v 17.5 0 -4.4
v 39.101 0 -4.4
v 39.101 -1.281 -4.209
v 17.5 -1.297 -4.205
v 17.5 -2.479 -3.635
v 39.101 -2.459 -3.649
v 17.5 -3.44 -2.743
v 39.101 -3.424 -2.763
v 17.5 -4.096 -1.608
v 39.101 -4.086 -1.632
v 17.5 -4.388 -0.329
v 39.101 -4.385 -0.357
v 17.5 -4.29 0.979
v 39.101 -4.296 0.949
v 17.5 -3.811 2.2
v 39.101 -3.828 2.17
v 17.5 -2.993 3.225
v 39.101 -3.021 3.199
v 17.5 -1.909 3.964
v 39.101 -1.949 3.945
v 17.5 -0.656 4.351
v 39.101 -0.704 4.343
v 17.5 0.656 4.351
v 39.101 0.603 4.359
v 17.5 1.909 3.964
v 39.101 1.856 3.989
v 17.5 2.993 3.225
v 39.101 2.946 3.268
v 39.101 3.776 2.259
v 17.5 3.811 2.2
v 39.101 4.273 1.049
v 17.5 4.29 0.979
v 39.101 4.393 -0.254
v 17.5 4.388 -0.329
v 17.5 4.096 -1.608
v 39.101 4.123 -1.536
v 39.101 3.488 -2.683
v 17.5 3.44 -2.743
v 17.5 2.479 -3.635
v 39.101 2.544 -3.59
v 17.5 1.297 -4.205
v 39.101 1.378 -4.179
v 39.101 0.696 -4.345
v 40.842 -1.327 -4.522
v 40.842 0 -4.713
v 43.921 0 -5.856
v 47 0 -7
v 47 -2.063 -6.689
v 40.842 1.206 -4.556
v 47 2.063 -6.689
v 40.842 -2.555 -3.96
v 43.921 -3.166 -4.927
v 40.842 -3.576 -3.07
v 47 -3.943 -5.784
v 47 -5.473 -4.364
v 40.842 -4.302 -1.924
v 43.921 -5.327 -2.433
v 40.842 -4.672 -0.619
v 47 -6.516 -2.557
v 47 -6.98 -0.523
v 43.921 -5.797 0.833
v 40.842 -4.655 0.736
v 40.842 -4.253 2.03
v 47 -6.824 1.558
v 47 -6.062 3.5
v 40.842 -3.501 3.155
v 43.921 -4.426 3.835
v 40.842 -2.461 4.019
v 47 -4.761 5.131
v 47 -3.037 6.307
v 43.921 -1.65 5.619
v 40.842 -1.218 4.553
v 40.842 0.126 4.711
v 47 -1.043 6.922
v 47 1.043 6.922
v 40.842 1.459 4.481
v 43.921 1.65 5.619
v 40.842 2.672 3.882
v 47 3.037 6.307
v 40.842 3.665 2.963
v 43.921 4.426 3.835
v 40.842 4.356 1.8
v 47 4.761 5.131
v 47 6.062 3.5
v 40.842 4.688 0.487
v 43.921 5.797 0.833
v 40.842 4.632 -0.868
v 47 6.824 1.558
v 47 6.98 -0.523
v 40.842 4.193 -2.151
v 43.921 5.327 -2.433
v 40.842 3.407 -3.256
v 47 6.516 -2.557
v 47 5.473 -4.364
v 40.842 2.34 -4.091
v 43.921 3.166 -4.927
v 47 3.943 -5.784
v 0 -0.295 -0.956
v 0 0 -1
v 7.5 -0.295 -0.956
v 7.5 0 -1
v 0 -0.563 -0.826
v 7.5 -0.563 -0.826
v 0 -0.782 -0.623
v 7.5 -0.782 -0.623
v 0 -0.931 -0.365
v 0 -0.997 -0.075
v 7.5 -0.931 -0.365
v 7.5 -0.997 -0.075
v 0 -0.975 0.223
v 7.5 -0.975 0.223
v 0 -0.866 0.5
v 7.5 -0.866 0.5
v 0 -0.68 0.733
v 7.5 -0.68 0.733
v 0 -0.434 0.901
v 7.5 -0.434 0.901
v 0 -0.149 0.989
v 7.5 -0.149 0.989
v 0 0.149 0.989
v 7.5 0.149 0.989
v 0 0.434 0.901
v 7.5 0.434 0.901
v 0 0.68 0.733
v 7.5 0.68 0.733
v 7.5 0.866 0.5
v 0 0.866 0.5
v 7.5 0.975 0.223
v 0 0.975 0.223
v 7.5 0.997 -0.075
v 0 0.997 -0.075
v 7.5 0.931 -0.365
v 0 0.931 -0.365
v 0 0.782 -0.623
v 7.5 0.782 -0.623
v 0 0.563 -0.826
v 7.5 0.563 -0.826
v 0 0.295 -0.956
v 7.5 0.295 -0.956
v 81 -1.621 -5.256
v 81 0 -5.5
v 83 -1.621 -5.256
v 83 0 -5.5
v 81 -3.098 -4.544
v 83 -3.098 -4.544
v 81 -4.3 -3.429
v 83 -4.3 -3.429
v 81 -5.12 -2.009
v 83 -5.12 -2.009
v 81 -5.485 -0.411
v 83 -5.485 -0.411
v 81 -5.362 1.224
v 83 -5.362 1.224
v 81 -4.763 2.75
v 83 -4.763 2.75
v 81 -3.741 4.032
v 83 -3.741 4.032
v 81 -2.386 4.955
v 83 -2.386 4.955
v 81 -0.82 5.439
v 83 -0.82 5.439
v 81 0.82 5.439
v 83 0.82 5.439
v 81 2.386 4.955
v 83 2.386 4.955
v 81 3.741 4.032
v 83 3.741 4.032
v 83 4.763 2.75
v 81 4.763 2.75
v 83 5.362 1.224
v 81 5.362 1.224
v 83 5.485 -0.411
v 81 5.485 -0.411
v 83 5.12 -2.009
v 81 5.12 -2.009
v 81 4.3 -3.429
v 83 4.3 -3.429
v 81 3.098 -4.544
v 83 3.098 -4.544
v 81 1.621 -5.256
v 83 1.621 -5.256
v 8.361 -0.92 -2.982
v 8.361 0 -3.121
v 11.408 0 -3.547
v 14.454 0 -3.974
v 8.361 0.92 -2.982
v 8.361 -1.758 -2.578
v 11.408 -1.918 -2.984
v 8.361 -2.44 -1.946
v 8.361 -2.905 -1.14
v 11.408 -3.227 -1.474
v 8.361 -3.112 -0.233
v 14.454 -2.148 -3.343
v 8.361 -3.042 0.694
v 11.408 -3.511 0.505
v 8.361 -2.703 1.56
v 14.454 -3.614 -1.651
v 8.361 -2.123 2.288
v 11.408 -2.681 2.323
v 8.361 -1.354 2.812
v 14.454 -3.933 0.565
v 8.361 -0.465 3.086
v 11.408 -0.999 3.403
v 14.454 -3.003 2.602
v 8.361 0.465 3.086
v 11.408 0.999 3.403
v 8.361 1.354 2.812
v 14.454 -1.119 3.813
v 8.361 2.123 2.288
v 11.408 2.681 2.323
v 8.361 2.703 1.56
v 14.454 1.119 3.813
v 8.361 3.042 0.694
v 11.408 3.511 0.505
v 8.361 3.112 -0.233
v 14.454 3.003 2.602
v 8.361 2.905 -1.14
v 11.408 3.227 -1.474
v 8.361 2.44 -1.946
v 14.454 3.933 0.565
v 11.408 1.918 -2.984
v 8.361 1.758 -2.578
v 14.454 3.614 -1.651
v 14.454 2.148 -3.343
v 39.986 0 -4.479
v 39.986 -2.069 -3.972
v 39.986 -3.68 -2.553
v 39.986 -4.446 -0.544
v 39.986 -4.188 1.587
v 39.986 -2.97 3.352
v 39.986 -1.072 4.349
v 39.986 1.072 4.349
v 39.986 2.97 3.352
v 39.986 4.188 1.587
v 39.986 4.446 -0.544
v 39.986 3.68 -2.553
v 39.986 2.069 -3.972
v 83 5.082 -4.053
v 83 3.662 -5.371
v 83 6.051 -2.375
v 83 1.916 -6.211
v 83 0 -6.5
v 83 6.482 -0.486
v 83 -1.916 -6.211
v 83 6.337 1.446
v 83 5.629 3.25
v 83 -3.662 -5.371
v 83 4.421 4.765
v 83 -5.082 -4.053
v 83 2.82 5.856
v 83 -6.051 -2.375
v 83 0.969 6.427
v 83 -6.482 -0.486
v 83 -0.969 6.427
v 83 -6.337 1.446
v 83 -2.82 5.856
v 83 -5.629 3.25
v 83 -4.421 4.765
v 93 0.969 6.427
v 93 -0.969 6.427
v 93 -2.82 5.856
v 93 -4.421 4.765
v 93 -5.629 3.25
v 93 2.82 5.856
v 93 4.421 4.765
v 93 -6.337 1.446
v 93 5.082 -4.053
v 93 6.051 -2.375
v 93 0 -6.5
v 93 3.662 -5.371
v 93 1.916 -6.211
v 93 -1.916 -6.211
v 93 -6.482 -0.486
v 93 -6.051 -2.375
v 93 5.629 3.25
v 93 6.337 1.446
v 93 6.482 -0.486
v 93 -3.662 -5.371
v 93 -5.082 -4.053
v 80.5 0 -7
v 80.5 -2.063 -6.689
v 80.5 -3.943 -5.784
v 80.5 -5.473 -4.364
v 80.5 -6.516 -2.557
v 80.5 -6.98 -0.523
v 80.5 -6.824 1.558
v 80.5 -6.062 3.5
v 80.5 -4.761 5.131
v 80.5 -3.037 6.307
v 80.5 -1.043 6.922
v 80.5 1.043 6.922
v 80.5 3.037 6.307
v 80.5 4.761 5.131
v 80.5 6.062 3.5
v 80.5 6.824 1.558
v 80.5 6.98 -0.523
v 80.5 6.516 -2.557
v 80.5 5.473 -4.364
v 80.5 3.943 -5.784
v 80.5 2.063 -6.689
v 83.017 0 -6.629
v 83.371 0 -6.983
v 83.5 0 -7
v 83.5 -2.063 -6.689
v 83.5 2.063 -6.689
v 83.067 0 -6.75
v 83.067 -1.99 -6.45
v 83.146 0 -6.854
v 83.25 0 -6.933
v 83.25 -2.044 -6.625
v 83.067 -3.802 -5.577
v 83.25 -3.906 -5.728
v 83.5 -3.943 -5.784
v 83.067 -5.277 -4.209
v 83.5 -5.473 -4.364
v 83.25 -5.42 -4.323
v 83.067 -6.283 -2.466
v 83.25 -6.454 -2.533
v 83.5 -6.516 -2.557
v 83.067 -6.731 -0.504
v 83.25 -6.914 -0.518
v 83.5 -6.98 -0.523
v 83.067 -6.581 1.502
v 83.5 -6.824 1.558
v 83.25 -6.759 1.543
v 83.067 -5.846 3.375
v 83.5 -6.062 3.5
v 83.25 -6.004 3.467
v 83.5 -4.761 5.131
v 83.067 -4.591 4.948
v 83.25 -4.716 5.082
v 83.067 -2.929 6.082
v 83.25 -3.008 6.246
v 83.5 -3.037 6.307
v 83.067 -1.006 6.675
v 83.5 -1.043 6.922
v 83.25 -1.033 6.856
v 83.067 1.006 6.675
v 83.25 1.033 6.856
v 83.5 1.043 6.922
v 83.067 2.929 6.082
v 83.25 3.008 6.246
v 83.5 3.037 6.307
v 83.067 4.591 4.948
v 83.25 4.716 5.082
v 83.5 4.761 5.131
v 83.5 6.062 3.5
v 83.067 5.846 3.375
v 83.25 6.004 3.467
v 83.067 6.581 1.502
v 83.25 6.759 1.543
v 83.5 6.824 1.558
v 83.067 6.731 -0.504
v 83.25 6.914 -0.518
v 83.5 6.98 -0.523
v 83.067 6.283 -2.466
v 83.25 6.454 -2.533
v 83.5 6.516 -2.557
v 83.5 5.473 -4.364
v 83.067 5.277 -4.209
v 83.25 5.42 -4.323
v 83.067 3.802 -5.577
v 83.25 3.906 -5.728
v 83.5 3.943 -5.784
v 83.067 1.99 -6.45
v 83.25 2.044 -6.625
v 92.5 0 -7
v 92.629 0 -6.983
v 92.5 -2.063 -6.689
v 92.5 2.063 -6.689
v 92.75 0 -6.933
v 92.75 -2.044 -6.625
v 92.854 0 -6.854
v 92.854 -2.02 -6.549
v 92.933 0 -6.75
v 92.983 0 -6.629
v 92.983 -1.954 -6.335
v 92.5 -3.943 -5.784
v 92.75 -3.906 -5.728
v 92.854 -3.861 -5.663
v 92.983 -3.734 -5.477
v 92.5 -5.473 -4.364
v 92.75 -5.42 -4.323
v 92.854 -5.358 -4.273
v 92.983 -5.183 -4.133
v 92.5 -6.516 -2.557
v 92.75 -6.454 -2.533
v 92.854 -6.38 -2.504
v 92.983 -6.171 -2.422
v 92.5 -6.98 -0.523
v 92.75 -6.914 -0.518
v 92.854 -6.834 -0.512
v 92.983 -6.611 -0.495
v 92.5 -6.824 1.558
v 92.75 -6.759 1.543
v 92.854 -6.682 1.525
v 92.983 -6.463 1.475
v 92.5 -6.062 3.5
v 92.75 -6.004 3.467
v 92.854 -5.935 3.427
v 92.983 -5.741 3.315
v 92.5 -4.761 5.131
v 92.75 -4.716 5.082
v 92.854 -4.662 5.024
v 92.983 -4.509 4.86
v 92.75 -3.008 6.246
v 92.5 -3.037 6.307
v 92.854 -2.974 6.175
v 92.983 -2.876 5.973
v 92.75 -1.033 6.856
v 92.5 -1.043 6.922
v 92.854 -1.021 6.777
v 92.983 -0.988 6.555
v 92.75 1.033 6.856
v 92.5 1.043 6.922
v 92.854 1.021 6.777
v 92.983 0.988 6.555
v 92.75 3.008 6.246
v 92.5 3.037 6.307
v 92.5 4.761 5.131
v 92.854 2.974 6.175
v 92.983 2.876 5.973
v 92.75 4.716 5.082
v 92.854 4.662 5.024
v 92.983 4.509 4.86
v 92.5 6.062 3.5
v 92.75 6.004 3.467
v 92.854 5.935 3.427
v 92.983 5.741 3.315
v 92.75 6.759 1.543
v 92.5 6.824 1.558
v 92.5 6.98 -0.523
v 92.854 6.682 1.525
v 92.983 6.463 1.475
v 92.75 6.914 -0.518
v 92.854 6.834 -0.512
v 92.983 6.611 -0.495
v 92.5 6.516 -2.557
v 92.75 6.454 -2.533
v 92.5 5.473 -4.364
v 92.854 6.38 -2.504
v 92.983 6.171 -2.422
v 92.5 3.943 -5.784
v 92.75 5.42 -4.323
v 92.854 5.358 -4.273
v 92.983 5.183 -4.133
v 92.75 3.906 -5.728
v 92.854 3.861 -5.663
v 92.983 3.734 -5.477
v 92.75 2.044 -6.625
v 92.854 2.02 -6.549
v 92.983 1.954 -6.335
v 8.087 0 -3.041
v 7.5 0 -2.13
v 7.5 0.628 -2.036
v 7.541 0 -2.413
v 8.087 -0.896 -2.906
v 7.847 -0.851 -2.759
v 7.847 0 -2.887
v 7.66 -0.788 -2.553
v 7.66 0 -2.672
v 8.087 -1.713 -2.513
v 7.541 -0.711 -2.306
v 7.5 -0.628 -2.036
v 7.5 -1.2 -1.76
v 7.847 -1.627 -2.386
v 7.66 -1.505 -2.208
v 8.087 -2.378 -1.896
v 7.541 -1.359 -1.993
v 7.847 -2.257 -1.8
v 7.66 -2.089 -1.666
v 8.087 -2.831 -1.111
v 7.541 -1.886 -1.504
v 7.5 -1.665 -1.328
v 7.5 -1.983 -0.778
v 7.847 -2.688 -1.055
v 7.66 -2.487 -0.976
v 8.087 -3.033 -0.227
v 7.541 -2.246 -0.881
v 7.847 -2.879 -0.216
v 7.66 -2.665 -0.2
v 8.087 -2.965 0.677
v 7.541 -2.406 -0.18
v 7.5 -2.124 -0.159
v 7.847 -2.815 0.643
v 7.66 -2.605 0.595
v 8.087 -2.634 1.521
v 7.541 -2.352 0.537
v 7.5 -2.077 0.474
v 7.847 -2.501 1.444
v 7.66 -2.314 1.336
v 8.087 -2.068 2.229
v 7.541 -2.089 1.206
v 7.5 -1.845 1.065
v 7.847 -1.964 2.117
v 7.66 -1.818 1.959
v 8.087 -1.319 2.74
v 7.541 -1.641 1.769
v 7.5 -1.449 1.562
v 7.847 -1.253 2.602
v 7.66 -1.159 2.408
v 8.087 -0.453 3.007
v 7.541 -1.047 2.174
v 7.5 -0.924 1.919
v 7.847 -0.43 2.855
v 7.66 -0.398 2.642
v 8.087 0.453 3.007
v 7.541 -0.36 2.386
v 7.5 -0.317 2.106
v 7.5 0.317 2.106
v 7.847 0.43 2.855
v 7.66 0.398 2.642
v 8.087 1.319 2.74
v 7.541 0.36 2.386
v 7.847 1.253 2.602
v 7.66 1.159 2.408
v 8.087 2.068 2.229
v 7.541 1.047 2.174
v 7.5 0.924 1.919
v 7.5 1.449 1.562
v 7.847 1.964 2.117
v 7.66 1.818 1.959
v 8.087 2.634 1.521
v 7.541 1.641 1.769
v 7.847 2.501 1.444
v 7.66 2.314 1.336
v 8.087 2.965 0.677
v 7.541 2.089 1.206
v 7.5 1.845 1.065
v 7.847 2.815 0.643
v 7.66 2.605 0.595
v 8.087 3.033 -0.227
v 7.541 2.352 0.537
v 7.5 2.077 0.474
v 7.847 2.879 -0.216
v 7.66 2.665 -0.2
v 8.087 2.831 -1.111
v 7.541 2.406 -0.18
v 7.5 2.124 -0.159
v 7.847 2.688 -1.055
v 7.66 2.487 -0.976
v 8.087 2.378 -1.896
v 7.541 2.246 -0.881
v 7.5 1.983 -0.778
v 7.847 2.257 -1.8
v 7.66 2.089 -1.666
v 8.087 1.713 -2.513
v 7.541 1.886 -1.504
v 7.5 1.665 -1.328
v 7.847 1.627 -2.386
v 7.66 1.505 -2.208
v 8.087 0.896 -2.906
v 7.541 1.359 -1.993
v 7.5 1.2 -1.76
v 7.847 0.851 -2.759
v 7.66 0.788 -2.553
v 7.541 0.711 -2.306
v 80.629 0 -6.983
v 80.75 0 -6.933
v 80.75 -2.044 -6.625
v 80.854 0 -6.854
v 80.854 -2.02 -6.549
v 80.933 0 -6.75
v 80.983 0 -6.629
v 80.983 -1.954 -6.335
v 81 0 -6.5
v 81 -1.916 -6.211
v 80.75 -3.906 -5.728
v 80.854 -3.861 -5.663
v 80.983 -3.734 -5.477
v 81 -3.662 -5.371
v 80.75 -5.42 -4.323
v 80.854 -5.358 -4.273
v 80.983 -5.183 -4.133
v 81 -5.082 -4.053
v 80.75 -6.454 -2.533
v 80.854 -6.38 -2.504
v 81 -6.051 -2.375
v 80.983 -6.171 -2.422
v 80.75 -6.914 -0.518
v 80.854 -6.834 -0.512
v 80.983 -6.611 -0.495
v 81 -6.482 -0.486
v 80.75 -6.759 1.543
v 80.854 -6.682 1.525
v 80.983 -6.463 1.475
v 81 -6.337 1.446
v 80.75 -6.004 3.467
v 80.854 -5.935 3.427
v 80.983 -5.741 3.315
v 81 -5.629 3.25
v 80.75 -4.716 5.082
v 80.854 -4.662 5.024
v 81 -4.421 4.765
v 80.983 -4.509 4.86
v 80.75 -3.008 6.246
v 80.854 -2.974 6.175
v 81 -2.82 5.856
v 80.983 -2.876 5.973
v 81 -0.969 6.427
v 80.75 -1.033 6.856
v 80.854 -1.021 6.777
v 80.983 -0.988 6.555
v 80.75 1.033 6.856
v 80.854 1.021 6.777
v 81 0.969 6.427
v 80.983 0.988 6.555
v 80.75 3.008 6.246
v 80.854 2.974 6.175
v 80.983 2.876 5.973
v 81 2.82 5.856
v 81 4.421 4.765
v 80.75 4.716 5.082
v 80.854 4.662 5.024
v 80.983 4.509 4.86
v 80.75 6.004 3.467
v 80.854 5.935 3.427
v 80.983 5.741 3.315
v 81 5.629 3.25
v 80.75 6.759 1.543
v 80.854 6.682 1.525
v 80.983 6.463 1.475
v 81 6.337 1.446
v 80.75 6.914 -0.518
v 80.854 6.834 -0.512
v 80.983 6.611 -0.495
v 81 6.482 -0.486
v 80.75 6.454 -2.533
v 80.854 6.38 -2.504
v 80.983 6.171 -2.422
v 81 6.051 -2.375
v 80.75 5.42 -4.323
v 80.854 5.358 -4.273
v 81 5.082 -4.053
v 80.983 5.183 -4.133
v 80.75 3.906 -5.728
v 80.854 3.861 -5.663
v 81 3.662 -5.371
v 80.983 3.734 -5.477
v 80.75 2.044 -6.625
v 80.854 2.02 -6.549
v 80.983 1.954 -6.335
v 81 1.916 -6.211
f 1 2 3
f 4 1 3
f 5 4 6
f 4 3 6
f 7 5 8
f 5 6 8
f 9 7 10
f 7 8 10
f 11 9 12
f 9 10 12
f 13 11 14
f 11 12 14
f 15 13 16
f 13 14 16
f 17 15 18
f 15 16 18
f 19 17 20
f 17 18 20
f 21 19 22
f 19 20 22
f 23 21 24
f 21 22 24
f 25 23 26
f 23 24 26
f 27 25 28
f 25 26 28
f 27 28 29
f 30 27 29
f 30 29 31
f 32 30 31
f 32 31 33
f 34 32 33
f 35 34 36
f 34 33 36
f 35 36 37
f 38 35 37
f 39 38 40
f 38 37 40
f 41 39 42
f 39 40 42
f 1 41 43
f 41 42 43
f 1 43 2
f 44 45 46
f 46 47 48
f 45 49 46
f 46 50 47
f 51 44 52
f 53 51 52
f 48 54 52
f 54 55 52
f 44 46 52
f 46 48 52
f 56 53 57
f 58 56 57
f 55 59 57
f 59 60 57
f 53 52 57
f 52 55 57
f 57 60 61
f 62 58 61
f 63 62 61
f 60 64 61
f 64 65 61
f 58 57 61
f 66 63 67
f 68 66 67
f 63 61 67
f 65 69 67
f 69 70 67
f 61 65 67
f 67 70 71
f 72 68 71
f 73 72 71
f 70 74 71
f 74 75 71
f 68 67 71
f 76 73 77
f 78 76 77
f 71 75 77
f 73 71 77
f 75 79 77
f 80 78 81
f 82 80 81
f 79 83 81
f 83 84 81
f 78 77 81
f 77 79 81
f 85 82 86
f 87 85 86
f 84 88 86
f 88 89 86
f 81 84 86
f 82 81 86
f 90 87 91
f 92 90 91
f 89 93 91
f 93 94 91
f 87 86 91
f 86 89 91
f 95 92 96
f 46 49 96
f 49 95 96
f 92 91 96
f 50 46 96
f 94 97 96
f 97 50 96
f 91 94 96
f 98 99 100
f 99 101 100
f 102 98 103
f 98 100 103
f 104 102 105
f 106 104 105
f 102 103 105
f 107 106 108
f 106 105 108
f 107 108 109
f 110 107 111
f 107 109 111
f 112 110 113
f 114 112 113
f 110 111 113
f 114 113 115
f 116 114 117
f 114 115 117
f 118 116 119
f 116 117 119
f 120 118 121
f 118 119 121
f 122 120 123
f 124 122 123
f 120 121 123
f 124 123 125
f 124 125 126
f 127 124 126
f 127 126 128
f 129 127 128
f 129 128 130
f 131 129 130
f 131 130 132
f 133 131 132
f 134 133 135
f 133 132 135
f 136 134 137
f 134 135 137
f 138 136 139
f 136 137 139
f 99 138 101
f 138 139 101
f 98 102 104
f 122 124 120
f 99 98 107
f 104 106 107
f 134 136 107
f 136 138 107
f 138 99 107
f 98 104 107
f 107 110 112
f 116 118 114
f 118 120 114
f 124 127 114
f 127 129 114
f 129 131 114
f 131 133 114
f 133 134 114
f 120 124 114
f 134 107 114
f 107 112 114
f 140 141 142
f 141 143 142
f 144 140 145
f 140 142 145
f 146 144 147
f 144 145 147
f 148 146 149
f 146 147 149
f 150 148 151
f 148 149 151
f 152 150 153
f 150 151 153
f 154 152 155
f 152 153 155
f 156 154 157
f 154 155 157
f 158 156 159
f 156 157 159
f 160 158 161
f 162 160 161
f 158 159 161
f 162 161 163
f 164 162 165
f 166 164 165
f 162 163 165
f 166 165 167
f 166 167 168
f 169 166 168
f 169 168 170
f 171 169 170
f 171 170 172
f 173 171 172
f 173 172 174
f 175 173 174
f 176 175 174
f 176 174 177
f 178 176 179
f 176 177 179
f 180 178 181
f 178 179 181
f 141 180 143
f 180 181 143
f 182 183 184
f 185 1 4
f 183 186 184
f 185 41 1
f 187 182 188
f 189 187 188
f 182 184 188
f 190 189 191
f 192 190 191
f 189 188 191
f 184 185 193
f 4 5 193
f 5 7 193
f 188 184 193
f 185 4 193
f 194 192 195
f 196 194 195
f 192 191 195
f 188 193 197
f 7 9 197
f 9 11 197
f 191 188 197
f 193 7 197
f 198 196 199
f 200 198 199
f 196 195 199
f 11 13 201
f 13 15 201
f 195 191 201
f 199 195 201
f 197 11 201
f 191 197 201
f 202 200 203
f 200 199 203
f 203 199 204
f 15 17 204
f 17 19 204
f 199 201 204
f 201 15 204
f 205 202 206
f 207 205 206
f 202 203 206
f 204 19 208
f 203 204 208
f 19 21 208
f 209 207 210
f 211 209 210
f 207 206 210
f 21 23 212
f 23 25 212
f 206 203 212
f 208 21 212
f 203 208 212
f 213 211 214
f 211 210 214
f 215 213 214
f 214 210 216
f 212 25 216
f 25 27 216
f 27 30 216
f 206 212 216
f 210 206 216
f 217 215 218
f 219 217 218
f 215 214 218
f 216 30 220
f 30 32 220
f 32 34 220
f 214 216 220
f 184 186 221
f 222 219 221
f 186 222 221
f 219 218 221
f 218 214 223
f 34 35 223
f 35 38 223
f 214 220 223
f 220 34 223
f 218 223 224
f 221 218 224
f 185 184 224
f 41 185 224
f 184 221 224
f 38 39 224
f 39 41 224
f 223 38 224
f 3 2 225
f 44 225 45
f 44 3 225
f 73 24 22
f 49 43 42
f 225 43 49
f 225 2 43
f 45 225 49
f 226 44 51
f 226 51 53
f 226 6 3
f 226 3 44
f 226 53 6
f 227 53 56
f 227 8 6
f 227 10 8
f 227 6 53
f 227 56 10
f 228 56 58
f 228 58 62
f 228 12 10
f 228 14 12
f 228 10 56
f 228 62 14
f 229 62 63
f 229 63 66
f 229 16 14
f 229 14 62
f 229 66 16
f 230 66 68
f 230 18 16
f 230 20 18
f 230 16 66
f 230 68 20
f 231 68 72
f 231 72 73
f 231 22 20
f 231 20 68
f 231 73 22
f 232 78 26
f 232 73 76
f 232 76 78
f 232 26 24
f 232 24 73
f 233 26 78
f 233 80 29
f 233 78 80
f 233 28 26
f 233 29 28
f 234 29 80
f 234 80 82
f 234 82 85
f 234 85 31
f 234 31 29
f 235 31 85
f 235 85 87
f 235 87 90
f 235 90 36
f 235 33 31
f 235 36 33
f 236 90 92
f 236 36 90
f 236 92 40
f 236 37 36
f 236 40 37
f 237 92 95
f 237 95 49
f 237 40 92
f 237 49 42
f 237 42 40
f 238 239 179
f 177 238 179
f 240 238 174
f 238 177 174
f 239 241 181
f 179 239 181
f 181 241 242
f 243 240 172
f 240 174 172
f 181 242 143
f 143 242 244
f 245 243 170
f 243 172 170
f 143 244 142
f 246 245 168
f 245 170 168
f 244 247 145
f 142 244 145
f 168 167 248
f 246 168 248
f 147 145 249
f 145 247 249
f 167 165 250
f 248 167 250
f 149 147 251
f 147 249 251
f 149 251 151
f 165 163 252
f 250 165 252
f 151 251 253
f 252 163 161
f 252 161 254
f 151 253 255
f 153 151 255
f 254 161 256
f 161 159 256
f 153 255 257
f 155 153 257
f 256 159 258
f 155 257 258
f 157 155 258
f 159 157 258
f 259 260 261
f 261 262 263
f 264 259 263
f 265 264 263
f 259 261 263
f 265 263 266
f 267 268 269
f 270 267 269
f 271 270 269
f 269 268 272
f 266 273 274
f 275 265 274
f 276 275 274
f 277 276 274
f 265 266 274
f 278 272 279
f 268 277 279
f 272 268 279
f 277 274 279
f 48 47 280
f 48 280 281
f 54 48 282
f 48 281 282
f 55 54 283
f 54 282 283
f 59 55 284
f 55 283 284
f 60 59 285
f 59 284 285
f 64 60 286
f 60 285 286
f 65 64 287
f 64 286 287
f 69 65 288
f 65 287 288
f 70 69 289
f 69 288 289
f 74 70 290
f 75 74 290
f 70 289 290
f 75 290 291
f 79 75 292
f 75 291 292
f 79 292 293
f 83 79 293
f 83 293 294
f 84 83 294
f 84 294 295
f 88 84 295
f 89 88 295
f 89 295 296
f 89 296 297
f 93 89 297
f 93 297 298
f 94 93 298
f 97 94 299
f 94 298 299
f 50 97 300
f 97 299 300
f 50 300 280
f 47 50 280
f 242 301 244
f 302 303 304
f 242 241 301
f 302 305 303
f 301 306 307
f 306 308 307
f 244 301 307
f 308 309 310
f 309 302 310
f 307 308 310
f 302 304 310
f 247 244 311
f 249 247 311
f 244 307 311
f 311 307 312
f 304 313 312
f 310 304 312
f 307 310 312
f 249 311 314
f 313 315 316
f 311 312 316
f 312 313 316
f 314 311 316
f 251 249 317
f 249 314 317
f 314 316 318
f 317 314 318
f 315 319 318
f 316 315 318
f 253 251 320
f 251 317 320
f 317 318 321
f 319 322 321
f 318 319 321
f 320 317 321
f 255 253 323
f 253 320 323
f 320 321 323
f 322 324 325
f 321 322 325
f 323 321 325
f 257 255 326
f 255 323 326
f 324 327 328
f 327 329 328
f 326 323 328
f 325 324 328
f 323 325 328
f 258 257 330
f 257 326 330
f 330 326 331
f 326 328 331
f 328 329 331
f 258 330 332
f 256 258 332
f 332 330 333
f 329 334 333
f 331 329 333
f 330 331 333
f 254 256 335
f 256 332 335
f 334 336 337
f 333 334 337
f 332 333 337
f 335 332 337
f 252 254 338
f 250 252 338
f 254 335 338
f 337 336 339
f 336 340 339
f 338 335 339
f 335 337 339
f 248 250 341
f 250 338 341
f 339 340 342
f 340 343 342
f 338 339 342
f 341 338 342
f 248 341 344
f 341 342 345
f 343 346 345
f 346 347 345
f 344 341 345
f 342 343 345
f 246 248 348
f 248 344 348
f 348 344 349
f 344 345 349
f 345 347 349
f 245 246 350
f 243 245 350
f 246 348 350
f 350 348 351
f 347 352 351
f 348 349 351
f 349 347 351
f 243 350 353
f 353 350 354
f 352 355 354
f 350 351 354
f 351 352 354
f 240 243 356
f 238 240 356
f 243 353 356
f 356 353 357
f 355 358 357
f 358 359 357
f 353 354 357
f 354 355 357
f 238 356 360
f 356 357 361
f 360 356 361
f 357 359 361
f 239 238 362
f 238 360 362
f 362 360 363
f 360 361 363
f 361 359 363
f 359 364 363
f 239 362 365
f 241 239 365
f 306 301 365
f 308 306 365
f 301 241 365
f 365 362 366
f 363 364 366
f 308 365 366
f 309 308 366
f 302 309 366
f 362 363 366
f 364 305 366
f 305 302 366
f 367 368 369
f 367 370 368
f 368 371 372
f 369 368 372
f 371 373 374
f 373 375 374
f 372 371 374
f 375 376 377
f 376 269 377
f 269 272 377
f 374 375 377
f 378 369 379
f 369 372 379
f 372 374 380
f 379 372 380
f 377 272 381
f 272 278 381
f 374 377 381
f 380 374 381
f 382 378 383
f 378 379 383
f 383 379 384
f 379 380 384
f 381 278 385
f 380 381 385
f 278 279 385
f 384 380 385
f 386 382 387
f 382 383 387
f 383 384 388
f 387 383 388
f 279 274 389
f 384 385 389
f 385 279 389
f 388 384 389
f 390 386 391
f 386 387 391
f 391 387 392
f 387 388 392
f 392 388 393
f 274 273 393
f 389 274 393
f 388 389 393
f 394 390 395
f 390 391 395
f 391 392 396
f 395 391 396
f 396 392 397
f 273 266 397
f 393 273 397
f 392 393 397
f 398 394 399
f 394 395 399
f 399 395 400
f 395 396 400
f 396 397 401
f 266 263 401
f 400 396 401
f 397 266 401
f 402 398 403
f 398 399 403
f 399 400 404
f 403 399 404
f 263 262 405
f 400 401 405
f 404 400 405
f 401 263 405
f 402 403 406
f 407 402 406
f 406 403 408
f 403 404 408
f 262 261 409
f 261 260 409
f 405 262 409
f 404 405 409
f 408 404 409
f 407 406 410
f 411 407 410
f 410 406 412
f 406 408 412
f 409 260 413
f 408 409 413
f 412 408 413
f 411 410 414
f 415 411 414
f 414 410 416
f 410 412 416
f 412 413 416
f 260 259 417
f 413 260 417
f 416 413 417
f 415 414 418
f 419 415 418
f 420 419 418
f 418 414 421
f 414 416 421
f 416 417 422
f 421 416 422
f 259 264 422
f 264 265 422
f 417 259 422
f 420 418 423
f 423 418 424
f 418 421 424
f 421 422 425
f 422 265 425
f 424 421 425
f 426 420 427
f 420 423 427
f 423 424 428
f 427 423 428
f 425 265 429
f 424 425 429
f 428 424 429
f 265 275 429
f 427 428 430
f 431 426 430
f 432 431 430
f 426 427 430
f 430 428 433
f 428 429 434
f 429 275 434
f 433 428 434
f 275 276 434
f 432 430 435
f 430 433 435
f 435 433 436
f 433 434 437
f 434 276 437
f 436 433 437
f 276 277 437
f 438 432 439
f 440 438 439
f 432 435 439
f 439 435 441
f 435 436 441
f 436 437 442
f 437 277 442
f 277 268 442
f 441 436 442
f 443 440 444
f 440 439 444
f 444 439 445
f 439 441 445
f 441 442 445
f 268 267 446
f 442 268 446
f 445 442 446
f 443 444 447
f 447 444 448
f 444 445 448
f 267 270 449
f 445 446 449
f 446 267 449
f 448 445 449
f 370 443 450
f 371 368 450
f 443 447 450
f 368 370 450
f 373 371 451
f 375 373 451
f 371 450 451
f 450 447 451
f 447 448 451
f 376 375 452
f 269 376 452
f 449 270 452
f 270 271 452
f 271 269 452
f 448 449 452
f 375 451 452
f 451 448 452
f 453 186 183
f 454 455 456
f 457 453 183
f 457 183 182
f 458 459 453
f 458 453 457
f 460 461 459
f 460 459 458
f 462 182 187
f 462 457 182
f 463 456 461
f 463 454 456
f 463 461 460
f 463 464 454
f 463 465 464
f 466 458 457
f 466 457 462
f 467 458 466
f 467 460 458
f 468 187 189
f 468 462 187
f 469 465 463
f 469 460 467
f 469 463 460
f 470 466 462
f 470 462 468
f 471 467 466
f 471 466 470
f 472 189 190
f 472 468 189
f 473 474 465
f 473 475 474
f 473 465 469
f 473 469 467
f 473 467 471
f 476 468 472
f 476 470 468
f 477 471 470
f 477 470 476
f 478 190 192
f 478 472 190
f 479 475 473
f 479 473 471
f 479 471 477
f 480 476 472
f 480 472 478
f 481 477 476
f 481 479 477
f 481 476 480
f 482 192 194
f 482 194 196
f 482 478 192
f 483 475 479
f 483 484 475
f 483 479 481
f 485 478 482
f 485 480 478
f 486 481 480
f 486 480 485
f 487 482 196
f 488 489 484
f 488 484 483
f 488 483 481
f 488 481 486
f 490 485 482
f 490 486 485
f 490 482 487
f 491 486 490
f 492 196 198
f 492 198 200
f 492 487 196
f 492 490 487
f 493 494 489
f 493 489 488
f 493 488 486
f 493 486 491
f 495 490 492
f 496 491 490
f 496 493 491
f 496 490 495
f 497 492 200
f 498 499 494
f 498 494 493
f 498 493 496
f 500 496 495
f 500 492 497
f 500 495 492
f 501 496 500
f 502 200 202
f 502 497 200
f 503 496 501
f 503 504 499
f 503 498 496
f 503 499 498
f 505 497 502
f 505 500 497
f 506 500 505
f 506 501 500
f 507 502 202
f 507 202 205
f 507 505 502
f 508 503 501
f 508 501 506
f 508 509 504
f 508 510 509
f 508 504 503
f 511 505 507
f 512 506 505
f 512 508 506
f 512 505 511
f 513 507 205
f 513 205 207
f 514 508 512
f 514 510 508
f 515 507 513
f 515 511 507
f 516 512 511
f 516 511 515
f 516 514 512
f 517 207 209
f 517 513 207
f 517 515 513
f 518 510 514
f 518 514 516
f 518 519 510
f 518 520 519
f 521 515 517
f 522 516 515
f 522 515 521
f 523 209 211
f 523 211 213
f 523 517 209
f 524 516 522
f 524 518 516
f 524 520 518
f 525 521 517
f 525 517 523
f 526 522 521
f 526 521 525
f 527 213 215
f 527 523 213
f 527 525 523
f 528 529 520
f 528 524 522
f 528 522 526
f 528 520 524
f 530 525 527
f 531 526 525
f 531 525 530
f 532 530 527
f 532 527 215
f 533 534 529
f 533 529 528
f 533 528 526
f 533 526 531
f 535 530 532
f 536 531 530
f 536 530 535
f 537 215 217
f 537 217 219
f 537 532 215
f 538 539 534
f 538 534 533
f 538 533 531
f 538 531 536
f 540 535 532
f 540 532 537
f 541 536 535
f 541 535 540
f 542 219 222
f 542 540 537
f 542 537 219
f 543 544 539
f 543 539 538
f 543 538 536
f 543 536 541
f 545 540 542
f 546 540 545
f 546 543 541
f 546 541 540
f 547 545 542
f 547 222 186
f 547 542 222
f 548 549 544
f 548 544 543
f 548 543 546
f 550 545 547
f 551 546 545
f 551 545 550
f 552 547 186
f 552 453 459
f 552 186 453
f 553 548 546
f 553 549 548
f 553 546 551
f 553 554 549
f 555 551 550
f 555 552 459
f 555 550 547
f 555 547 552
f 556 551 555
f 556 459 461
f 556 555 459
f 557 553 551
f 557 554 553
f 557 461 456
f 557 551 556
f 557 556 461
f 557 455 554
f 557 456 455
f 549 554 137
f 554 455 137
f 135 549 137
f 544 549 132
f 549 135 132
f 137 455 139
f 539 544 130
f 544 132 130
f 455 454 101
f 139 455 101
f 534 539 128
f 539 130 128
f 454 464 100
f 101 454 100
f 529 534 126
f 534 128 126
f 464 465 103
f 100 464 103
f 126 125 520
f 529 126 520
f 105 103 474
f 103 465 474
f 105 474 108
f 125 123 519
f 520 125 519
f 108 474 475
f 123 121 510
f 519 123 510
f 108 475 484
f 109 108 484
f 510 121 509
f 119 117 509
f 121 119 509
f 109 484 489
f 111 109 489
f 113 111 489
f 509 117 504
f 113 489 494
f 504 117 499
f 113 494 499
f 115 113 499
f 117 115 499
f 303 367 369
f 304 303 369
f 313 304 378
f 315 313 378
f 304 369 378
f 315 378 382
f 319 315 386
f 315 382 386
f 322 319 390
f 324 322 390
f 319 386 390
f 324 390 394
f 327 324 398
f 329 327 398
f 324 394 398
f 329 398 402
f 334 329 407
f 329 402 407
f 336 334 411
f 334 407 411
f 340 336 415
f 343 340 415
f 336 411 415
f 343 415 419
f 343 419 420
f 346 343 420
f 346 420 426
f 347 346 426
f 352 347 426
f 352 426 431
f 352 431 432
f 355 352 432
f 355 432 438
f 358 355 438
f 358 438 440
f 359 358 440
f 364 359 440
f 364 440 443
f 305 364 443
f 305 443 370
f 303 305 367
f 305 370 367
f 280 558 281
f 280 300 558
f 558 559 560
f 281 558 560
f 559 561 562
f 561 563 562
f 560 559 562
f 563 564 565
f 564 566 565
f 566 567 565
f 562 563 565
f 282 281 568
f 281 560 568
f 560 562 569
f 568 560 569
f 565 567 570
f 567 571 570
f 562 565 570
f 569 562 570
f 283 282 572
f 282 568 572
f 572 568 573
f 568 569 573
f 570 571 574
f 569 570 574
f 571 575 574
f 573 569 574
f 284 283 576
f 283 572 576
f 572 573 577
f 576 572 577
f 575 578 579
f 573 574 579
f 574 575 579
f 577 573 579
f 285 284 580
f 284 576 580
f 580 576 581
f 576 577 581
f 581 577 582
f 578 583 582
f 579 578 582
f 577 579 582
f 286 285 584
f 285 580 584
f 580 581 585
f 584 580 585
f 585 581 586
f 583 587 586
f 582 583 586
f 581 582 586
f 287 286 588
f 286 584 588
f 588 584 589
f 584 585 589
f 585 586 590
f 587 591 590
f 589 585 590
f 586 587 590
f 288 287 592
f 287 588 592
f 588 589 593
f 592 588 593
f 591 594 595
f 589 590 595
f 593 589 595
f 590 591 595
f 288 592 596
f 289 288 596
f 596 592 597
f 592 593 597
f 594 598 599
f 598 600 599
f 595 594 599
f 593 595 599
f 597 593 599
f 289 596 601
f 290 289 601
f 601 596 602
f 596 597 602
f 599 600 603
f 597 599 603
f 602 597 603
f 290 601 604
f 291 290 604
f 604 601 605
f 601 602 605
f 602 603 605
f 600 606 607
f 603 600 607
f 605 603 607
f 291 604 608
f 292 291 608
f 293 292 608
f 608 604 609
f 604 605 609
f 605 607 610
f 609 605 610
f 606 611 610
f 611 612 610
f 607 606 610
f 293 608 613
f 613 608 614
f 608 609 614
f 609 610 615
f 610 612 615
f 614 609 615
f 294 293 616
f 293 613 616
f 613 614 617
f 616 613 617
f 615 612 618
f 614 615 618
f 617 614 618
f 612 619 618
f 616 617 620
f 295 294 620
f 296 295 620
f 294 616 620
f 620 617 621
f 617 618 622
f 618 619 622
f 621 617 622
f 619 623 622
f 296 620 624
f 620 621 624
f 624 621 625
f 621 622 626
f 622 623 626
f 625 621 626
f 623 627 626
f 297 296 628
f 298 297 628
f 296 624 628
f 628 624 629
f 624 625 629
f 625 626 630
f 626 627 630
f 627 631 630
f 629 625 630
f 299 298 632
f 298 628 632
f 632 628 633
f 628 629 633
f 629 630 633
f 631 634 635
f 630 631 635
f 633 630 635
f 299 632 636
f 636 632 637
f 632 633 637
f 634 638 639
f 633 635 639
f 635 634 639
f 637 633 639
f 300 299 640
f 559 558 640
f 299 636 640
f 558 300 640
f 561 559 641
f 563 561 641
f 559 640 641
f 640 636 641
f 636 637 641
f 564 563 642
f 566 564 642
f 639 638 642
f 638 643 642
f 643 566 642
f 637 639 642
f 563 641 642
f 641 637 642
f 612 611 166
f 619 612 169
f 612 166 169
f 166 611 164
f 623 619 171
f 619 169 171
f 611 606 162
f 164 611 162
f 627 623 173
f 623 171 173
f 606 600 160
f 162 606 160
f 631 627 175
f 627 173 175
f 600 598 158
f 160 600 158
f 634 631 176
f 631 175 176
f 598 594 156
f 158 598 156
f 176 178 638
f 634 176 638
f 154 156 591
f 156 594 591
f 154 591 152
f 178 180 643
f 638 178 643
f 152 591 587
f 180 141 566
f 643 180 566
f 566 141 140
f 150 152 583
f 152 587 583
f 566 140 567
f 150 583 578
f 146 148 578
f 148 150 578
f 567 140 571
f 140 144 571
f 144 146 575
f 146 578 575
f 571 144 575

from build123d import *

# Parameters (mm, degrees)
FILETE1_R = 5
FILETE3_R = 1
FILETE4_R = 0.5


with BuildPart() as part:
    # Esboço1 → Revolução1 (revolve)
    with BuildSketch(Plane.XY, mode=Mode.PRIVATE) as revolu_o1_sk:
        Polygon((0, 0), (0, 1), (7.5, 1), (7.5, 3), (17.5, 4.4), (40, 4.4), (47, 7), (81, 7), (81, 5.5), (83, 5.5), (83, 7), (93, 7), (93, 0), align=None)
    revolve(revolu_o1_sk.sketch.rotate(Axis((93, 0, 0), (-1, 0, 0)), 90), axis=Axis((93, 0, 0), (-1, 0, 0)))

    # Filete1
    filete1_edges = [part.edges().sort_by_distance(p)[0] for p in [
        (40, 0, 4.4),
    ]]
    fillet(filete1_edges, radius=FILETE1_R)

    # Filete3
    filete3_edges = [part.edges().sort_by_distance(p)[0] for p in [
        (7.5, 0, 3),
    ]]
    fillet(filete3_edges, radius=FILETE3_R)

    # Filete4
    filete4_edges = [part.edges().sort_by_distance(p)[0] for p in [
        (81, 0, 7),
        (93, 0, 7),
        (83, 0, 7),
    ]]
    fillet(filete4_edges, radius=FILETE4_R)


solid = part.part
